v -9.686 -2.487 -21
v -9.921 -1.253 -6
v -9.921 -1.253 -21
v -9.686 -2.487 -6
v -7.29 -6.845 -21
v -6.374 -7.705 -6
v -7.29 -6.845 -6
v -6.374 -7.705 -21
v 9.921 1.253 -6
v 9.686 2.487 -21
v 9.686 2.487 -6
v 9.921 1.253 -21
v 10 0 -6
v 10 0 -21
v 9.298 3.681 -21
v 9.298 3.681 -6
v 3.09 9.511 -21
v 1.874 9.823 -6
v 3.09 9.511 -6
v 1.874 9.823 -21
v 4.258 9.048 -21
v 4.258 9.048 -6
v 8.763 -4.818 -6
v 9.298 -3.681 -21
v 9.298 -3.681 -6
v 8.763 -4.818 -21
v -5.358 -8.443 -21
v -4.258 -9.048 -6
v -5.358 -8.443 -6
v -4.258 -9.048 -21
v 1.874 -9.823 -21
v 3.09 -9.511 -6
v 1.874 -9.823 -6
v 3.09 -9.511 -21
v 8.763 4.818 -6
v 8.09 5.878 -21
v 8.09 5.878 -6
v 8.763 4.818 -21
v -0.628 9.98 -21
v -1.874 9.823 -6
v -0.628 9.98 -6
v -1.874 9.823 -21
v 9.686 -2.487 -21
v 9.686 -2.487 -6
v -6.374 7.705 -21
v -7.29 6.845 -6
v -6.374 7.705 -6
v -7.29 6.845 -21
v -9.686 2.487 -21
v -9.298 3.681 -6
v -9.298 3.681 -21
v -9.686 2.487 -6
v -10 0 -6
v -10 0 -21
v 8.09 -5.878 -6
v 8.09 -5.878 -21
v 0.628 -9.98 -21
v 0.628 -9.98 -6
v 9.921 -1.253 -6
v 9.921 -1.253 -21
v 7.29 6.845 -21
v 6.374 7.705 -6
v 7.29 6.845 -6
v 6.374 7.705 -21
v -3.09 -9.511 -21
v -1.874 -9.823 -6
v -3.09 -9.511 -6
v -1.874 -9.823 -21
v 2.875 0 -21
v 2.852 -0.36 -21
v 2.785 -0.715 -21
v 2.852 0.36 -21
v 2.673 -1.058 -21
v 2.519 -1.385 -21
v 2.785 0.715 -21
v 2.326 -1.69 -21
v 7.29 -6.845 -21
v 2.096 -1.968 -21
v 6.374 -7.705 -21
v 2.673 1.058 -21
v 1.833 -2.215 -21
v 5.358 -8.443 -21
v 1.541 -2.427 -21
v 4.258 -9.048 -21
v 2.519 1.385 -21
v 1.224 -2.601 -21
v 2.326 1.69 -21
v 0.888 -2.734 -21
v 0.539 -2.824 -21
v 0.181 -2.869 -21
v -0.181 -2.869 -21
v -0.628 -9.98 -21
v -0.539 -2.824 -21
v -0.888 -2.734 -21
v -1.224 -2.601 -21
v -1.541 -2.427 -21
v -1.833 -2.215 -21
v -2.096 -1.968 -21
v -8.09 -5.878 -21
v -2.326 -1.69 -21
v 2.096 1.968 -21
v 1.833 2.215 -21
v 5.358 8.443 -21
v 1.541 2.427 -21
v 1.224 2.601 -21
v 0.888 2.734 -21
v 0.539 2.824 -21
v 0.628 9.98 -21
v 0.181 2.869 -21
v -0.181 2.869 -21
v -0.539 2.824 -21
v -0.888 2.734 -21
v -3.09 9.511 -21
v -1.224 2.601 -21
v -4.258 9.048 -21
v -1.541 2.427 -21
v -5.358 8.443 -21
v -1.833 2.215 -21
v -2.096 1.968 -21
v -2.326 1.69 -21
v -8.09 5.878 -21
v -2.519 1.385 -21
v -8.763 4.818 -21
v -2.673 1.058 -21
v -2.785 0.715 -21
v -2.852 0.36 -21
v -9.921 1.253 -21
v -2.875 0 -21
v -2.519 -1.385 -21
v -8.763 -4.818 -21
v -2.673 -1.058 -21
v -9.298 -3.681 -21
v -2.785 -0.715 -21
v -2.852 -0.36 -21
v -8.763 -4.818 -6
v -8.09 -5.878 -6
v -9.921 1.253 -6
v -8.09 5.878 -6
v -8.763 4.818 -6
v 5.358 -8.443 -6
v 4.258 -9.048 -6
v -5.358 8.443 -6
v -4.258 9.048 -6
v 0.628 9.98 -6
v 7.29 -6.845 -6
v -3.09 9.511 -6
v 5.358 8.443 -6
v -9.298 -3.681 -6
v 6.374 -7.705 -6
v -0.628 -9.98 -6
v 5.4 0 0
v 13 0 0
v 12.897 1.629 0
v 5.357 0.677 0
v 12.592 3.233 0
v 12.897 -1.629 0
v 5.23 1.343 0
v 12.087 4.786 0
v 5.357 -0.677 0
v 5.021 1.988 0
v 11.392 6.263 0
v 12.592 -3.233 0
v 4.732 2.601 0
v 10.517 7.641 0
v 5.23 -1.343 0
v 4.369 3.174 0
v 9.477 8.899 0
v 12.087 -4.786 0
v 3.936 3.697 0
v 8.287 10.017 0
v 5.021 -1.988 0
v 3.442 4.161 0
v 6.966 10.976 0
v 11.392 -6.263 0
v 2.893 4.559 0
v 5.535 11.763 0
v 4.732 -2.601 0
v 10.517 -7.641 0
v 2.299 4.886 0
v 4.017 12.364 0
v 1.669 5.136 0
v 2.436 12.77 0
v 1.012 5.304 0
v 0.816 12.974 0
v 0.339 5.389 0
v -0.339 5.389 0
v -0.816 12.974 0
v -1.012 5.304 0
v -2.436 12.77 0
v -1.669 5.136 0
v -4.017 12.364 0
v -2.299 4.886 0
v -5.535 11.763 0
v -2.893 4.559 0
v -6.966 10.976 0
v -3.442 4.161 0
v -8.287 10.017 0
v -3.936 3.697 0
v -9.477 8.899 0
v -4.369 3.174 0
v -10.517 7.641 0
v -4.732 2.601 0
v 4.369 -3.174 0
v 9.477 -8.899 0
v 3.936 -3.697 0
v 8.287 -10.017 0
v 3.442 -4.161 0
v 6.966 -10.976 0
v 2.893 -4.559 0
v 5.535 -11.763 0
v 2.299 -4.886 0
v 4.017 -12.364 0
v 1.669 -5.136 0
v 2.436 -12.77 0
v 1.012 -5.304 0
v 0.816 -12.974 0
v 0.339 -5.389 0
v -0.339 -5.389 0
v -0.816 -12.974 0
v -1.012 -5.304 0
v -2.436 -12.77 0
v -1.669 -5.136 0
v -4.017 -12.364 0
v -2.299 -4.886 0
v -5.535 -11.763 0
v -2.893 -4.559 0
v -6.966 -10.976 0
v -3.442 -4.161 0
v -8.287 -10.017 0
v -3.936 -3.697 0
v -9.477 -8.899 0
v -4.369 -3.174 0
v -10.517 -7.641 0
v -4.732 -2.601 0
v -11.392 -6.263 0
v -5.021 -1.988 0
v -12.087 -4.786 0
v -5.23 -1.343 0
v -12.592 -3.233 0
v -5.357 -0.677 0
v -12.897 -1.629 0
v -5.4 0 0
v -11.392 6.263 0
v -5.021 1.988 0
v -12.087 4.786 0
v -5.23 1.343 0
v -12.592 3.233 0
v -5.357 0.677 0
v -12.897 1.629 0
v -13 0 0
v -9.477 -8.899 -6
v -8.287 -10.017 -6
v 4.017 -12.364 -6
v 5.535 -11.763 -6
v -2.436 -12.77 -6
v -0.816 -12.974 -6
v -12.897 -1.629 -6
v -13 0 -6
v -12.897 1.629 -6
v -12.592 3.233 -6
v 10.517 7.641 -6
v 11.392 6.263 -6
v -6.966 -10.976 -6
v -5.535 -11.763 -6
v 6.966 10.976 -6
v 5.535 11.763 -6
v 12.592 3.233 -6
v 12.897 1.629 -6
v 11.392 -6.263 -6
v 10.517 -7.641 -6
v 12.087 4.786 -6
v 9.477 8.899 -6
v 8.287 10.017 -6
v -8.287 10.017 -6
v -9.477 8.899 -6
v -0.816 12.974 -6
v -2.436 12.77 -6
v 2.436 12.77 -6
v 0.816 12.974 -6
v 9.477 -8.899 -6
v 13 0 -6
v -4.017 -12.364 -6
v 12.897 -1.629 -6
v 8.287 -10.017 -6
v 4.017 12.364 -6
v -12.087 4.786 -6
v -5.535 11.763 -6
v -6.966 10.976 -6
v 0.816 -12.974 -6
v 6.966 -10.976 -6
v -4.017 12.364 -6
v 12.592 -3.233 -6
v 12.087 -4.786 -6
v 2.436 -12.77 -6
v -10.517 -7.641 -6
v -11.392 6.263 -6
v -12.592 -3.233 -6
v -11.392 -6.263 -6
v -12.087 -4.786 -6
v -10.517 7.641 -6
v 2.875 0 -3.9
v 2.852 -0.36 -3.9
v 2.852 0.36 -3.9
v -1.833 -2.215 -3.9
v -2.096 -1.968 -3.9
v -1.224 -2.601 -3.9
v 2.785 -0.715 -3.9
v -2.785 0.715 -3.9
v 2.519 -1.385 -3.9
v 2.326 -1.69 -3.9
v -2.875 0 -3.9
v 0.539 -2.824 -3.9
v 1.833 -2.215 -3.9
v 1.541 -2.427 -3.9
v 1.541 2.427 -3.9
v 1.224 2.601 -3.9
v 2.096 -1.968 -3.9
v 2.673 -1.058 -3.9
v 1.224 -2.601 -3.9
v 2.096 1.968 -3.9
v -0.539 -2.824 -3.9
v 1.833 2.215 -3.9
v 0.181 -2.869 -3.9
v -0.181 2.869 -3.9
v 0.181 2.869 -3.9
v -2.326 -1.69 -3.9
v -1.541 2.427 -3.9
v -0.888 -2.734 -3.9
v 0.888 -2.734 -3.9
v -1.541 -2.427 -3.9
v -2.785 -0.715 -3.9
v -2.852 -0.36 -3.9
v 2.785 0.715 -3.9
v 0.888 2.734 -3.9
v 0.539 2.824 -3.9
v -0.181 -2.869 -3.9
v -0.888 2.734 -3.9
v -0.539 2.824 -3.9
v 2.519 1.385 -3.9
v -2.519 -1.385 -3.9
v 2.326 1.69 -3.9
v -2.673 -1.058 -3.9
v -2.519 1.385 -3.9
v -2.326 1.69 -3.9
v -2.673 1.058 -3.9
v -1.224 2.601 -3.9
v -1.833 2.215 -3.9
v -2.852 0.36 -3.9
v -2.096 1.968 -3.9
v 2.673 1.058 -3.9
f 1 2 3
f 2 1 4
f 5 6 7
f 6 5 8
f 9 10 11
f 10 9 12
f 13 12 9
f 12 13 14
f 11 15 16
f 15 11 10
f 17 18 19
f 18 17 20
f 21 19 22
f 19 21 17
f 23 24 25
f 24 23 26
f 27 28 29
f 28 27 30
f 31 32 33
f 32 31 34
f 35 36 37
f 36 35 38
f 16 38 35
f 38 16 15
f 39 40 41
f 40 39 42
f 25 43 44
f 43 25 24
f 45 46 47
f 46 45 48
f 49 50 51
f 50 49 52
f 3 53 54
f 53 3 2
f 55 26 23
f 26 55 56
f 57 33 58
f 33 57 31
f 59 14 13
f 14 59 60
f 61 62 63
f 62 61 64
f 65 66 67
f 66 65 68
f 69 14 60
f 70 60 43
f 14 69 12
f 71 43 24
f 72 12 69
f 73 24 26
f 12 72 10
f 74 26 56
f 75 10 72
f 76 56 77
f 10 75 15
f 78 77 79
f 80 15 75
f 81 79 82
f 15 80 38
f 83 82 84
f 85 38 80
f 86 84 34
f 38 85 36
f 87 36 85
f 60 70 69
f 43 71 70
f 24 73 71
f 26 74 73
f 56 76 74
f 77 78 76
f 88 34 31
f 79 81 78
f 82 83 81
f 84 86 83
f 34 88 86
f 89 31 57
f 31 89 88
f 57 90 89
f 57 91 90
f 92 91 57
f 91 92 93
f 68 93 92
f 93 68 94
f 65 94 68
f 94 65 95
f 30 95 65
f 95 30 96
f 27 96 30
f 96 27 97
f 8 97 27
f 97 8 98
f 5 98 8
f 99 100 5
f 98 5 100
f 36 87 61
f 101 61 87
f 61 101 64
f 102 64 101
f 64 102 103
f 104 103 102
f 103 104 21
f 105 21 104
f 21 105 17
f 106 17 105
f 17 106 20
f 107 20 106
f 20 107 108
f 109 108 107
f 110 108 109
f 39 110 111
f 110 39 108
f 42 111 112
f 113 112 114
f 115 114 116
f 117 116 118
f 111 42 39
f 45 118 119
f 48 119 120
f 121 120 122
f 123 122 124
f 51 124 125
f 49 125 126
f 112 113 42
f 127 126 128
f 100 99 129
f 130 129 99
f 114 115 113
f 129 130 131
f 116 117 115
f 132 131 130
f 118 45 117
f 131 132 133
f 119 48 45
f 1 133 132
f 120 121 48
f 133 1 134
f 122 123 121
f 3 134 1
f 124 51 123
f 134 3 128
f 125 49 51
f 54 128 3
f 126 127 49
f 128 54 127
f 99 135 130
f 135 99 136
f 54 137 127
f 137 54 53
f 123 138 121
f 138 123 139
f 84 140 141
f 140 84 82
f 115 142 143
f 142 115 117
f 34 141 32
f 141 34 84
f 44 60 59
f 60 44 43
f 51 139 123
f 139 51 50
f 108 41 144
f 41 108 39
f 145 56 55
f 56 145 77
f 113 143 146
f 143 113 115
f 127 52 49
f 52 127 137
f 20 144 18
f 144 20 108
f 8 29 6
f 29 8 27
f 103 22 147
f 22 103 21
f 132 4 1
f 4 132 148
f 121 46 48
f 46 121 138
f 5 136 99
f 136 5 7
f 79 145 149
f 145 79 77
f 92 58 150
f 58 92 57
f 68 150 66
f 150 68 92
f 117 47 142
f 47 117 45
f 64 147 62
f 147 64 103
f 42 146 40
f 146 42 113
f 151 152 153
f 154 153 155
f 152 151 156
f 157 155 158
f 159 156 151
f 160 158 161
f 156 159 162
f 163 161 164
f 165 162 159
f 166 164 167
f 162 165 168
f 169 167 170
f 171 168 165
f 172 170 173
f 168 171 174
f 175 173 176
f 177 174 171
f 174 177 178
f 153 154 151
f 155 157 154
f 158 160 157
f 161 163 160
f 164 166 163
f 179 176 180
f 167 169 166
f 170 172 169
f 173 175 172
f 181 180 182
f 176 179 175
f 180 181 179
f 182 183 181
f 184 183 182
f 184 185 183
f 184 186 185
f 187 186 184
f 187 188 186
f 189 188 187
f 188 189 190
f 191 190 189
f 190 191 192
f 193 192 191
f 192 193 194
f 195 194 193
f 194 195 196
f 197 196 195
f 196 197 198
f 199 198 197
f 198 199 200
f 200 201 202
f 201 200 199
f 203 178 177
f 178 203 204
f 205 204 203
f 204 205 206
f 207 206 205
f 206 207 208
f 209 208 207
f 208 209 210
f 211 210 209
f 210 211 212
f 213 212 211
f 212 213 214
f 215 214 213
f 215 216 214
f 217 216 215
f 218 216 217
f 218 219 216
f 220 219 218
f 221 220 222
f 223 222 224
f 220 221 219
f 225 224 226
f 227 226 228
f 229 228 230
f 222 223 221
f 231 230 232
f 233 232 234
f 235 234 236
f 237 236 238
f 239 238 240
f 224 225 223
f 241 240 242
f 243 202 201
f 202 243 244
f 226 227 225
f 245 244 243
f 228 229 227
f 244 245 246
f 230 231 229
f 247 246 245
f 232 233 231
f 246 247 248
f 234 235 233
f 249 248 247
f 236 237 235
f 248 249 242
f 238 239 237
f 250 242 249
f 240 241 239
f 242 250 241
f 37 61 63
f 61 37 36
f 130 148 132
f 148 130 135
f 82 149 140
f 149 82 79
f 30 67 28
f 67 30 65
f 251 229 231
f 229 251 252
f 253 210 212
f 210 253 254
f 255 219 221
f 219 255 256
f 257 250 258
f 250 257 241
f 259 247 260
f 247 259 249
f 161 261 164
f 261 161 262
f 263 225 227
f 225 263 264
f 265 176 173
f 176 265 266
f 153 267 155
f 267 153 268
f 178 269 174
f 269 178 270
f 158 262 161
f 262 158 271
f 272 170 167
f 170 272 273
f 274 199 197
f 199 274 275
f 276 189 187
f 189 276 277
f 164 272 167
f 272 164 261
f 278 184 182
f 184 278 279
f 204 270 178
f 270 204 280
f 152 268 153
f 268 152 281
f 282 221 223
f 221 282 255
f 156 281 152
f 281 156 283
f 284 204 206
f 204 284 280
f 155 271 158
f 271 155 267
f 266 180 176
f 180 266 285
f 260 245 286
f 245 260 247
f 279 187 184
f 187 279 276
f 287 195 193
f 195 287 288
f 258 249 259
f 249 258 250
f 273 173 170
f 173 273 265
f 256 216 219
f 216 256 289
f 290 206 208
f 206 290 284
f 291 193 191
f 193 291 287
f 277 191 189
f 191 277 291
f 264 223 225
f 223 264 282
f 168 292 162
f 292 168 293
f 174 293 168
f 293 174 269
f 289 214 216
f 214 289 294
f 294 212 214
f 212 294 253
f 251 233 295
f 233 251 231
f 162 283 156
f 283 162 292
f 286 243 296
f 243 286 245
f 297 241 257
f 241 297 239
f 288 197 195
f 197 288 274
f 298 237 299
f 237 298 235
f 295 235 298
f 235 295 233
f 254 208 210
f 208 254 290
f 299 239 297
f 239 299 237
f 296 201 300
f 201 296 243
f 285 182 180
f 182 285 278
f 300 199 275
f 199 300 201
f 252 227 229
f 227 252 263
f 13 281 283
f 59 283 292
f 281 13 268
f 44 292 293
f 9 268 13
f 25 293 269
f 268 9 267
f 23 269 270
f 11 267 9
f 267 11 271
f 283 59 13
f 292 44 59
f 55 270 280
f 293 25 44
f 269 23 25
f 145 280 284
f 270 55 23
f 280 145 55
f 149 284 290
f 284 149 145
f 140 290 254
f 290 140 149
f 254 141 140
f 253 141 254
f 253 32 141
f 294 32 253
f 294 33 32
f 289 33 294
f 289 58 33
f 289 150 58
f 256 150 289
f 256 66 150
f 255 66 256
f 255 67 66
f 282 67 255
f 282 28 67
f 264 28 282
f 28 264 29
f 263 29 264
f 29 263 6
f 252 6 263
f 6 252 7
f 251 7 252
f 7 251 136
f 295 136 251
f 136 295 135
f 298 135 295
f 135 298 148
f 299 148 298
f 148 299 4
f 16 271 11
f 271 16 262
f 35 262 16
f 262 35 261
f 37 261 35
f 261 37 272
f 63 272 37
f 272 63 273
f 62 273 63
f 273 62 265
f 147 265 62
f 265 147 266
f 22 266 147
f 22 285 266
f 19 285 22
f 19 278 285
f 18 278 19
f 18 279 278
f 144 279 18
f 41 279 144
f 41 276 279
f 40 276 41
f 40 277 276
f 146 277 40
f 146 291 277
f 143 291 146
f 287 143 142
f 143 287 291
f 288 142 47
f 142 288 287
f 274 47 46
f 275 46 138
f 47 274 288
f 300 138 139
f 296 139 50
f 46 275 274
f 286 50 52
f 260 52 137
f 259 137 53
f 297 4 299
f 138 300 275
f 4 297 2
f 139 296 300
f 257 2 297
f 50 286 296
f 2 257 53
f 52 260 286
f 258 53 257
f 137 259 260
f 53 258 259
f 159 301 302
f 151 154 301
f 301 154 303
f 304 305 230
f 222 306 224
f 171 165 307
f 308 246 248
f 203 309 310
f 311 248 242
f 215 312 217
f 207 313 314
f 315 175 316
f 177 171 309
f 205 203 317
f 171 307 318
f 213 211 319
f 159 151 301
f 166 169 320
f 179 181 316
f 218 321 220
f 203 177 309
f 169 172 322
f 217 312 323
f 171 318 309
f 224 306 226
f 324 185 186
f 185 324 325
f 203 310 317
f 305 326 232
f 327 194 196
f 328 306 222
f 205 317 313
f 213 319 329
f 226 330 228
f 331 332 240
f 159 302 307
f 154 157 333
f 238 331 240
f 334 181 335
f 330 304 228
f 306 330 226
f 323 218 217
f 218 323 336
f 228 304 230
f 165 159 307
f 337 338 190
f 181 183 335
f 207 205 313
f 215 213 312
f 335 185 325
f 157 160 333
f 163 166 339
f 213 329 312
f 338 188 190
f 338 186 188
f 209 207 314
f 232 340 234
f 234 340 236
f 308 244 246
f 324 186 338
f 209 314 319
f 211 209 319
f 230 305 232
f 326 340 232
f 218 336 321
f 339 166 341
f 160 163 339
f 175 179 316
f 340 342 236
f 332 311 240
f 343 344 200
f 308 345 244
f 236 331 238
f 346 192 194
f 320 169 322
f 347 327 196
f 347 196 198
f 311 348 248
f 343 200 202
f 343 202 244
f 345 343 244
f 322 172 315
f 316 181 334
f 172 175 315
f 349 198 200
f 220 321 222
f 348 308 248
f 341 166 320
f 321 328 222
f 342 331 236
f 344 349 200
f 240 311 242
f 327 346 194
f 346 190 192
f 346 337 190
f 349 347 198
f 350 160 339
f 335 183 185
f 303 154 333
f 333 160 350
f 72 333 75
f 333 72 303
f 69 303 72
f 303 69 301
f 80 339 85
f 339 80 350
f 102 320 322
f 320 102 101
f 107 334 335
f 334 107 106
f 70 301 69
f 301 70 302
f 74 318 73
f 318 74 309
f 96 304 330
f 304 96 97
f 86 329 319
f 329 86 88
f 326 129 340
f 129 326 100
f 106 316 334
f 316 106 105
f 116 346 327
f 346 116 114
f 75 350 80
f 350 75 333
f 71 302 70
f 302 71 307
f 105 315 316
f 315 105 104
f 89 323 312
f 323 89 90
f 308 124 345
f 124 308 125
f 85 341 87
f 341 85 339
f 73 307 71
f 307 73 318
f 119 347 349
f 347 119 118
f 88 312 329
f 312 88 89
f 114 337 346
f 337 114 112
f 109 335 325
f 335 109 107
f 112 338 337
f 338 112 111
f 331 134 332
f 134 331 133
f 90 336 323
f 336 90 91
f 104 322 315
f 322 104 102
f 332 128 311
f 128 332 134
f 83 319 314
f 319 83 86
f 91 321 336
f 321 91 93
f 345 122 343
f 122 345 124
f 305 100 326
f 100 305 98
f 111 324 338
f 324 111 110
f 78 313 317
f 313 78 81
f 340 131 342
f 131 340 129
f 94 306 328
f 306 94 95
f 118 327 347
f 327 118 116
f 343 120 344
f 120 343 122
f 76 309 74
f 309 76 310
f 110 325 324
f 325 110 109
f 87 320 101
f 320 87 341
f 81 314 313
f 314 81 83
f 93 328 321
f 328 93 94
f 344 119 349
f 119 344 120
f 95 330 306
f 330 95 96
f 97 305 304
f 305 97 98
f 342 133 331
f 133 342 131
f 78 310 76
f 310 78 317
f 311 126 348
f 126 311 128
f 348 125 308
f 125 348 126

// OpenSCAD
$fn = 50;


difference() {
	union() {
		translate(v = [0, 0, -21.0000000000]) {
			cylinder(h = 21, r = 10.0000000000);
		}
		translate(v = [0, 0, -6.0000000000]) {
			cylinder(h = 6, r = 13.0000000000);
		}
	}
	union() {
		translate(v = [0, 0, 0]) {
			rotate(a = [0, 0, 0]) {
				difference() {
					union() {
						#translate(v = [0, 0, -21.0000000000]) {
							cylinder(h = 21, r = 2.6000000000);
						}
						#translate(v = [0, 0, -3.9000000000]) {
							cylinder(h = 3.9000000000, r = 10.0000000000, r1 = 2.8750000000, r2 = 5.4000000000);
						}
						#translate(v = [0, 0, -21.0000000000]) {
							cylinder(h = 21, r = 2.8750000000);
						}
						#translate(v = [0, 0, -21.0000000000]) {
							cylinder(h = 21, r = 2.6000000000);
						}
					}
					union();
				}
			}
		}
	}
}
